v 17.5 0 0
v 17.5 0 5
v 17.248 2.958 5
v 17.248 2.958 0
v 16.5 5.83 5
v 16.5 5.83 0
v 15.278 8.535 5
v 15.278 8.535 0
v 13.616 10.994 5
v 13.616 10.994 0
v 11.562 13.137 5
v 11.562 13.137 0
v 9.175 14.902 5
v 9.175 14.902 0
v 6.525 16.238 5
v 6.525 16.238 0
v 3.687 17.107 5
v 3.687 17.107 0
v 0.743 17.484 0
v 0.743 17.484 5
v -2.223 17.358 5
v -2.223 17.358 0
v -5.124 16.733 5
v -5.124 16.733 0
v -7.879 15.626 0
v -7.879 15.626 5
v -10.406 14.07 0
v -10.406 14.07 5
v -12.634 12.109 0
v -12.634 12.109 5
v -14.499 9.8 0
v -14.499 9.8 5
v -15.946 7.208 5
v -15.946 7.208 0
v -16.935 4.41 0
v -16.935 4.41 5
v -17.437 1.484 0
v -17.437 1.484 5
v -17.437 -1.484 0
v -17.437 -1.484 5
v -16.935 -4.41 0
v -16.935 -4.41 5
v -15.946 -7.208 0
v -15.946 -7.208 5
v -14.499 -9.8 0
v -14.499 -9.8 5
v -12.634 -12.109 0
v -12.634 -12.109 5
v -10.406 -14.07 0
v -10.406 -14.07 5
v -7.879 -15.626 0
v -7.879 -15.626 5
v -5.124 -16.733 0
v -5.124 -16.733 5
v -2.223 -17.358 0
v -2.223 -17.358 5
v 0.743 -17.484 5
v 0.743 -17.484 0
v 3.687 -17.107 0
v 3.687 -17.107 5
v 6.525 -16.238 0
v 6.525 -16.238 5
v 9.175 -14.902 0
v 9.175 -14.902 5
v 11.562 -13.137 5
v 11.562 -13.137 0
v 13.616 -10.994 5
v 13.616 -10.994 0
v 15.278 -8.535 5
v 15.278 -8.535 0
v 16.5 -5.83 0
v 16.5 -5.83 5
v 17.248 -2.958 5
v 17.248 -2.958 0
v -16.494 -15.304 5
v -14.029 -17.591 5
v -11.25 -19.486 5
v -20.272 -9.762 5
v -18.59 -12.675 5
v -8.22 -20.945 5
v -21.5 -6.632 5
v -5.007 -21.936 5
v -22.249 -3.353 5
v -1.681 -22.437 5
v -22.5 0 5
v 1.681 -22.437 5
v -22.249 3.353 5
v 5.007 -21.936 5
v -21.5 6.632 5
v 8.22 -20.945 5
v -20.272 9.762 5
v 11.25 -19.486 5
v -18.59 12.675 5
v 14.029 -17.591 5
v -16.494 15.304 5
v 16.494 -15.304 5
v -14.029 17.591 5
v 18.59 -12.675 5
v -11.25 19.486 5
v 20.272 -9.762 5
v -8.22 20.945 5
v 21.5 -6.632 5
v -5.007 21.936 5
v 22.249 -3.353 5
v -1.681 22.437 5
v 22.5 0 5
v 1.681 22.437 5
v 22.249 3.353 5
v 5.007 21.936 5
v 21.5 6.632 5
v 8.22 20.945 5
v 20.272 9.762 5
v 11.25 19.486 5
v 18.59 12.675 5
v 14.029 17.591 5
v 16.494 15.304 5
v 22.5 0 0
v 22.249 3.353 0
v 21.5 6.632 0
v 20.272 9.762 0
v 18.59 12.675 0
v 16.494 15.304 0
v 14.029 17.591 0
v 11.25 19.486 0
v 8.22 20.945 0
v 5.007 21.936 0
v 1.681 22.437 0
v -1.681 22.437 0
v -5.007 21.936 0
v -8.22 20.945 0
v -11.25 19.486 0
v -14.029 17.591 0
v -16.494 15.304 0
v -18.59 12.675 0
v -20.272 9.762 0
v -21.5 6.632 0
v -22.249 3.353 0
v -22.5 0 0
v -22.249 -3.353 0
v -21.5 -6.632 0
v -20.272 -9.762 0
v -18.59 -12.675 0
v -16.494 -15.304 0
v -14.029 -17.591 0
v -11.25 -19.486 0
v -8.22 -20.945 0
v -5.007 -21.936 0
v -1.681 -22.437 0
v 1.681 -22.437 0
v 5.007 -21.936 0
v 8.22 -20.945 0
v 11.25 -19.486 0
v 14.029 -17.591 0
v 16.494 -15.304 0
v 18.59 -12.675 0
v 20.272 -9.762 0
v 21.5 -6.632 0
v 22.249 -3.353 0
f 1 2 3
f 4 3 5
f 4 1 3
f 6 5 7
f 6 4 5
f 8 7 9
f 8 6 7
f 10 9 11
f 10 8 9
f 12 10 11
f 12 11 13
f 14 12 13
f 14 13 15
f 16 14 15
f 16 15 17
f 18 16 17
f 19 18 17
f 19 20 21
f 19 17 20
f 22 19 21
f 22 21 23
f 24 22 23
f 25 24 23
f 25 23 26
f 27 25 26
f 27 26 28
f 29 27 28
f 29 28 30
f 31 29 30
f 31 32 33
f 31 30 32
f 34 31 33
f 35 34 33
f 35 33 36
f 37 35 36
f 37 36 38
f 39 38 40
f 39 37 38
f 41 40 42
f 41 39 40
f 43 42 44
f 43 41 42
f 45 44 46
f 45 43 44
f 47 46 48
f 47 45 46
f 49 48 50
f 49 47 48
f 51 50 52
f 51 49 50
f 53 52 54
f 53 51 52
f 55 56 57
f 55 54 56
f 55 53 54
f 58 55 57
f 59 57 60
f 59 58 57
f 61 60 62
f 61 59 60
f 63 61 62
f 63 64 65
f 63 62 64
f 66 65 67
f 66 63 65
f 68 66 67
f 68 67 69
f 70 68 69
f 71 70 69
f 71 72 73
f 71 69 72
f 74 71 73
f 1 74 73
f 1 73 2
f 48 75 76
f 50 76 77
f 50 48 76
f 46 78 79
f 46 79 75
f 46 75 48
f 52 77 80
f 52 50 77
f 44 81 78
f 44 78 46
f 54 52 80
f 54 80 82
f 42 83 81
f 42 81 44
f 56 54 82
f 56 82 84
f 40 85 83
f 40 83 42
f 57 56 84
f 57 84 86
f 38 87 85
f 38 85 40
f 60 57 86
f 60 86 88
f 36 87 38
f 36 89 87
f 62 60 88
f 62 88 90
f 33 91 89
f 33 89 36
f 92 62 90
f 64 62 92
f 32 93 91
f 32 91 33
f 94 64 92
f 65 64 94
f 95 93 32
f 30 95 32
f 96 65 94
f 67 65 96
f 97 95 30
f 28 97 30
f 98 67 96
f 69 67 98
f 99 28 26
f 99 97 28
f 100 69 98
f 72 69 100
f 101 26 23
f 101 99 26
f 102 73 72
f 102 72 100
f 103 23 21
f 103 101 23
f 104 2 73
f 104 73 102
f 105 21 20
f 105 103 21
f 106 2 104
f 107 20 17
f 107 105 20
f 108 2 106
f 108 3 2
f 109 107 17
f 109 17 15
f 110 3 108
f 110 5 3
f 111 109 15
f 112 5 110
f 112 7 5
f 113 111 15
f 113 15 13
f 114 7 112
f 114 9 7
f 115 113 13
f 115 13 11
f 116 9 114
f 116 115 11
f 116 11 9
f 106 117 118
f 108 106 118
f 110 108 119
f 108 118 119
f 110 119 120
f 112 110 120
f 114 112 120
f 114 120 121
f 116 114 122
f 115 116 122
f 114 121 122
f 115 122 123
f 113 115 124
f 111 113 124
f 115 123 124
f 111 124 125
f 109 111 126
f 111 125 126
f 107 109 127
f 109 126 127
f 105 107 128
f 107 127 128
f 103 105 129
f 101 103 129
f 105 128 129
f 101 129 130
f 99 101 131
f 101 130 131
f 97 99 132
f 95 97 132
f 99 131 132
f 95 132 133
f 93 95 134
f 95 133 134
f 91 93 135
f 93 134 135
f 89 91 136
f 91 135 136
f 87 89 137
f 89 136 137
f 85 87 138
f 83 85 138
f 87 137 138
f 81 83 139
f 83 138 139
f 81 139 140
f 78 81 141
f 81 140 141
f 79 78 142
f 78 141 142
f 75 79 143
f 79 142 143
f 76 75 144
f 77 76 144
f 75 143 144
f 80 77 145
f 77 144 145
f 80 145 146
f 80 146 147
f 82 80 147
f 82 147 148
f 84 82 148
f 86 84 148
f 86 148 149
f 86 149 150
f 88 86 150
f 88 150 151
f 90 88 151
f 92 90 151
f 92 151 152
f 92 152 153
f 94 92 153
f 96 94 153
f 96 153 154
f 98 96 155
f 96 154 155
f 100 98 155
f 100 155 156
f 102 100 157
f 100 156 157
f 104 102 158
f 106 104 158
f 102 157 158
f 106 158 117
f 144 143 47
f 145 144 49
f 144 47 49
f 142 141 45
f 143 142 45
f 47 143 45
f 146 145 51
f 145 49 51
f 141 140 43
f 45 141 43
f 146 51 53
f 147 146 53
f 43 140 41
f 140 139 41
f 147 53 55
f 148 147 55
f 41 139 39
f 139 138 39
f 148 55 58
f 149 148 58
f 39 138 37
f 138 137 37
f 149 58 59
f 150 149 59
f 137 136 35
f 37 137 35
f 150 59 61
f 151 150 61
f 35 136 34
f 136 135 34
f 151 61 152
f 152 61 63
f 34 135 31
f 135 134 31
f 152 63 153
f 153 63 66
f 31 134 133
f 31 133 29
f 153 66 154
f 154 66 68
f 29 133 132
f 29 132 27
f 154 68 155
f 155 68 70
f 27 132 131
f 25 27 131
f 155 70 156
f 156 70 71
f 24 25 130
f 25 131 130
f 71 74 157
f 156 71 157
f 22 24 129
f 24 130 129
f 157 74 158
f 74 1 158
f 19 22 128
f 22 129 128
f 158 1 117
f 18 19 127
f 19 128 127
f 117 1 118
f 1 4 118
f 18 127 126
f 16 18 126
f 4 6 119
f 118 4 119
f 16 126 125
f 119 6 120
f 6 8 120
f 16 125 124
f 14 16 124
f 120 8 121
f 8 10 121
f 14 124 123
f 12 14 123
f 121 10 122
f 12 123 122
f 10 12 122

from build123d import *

# Parameters (mm, degrees)
CYLINDER006_R     = 17.5
CYLINDER006_DEPTH = 10
CYLINDER005_R     = 22.5
CYLINDER005_DEPTH = 5


with BuildPart() as cylinder006:
    # Cylinder006 → Cylinder006 (new body)
    with BuildSketch(Plane.XY):
        Circle(CYLINDER006_R)
    extrude(amount=CYLINDER006_DEPTH)


with BuildPart() as cut005:
    # Cylinder005 → Cylinder005 (new body)
    with BuildSketch(Plane.XY):
        Circle(CYLINDER005_R)
    extrude(amount=CYLINDER005_DEPTH)

    # Cut005: cut Cylinder006
    add(cylinder006.part, mode=Mode.SUBTRACT)


solid = cut005.part
